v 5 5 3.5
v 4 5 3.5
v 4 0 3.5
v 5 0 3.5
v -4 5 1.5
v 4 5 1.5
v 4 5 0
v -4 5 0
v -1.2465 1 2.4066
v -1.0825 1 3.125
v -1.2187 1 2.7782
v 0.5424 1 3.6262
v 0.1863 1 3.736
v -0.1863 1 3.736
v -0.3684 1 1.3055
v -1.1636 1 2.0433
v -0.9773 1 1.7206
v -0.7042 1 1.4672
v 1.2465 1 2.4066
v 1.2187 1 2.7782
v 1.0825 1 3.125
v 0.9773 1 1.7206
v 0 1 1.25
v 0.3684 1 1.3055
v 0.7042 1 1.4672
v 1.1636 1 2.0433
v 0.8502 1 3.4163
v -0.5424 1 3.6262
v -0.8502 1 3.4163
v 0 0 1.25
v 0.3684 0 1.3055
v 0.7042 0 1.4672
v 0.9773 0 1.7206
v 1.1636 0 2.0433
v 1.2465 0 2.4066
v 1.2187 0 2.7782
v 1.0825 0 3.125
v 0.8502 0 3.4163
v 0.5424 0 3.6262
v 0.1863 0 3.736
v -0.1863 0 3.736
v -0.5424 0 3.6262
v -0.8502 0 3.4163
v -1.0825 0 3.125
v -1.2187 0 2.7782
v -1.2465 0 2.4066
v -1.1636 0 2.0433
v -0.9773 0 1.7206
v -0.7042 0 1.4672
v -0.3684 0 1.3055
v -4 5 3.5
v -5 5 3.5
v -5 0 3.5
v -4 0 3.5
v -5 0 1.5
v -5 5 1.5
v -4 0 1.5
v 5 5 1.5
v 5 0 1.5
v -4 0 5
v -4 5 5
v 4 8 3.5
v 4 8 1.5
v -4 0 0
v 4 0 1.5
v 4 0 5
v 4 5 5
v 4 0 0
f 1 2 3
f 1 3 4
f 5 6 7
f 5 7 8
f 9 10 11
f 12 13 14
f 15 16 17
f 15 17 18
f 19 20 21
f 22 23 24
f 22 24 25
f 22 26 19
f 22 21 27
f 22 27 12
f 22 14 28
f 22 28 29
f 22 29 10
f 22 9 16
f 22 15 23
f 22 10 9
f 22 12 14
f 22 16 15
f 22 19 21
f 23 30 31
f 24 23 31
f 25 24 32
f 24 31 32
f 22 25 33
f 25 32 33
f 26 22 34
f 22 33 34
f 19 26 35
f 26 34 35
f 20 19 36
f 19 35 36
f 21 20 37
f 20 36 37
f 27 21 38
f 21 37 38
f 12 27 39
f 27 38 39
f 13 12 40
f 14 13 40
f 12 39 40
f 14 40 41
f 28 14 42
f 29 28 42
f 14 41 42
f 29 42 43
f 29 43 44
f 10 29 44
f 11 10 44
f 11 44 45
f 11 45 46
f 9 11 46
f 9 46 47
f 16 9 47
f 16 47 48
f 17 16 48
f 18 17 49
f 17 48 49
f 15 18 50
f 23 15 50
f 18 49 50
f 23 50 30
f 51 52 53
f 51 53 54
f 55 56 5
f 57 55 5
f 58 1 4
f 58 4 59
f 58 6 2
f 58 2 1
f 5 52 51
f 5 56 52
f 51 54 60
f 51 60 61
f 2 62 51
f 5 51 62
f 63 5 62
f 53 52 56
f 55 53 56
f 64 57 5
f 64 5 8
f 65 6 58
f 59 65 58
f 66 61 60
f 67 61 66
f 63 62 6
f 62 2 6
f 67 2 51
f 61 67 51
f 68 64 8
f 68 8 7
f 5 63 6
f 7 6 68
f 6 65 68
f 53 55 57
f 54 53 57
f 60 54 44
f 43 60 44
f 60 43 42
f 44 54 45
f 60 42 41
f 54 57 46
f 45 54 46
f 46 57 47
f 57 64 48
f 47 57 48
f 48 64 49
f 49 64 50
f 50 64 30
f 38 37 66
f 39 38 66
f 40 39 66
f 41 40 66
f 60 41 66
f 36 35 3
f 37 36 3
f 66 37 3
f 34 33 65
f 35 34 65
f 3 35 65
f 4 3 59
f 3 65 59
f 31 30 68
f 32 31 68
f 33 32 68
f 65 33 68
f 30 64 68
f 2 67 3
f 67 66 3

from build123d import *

# Parameters (mm, degrees)
SKETCH_1_W          = 8
SKETCH_1_H          = 5
EXTRUDE_1_DEPTH     = 5
SKETCH_2_W          = 1
SKETCH_2_H          = 2
EXTRUDE_2_DEPTH     = 5
EXTRUDE_3_DEPTH     = 1
SKETCH_7_W          = 8
SKETCH_7_H          = 1.5
EXTRUDE_4_DEPTH     = 1
CUT_EXTRUDE_2_DEPTH = 11.677078252
CUT_EXTRUDE_3_DEPTH = 10
CUT_EXTRUDE_4_DEPTH = 10
SKETCH_11_R         = 1.25
CUT_EXTRUDE_5_DEPTH = 1


with BuildPart() as part:
    # 草图1 → 凸台-拉伸1 (new body)
    with BuildSketch(Plane.XY):
        with Locations((0, 2.5)):
            Rectangle(SKETCH_1_W, SKETCH_1_H)
    extrude(amount=EXTRUDE_1_DEPTH)

    # 草图2 → 凸台-拉伸2 (add)
    with BuildSketch(Plane(origin=(0, 5, 0), x_dir=(1, 0, 0), z_dir=(0, 1, 0))):
        with Locations((-4.5, -2.5)):
            Rectangle(SKETCH_2_W, SKETCH_2_H)
        with Locations((4.5, -2.5)):
            Rectangle(SKETCH_2_W, SKETCH_2_H)
    extrude(amount=-EXTRUDE_2_DEPTH)

    # 草图6 → 凸台-拉伸3 (add, symmetric)
    with BuildSketch(Plane.XY.offset(2.5)):
        Polygon((4, 5), (4, 8), (-4, 5), align=None)
    extrude(amount=EXTRUDE_3_DEPTH, both=True)

    # 草图7 → 凸台-拉伸4 (add)
    with BuildSketch(Plane(origin=(0, 5, 0), x_dir=(1, 0, 0), z_dir=(0, 1, 0))):
        with Locations((0, -0.75)):
            Rectangle(SKETCH_7_W, SKETCH_7_H)
        with Locations((0, -4.25)):
            Rectangle(SKETCH_7_W, SKETCH_7_H)
    extrude(amount=EXTRUDE_4_DEPTH)

    # 草图8 → 切除-拉伸2 (cut, through all)
    with BuildSketch(Plane.XY.offset(5)):
        Polygon((-4, 5), (4, 8), (-4.143186706, 8), (-4.143186706, 5), align=None)
    extrude(amount=-CUT_EXTRUDE_2_DEPTH, mode=Mode.SUBTRACT)

    # 草图9 → 切除-拉伸3 (cut)
    with BuildSketch(Plane(origin=(0, 0, 1.5), x_dir=(-1, 0, 0), z_dir=(0, 0, -1))):
        Polygon((-4, 8), (-4, 5), (4, 5), align=None)
    extrude(amount=CUT_EXTRUDE_3_DEPTH, mode=Mode.SUBTRACT)

    # 草图10 → 切除-拉伸4 (cut)
    with BuildSketch(Plane.XY.offset(3.5)):
        Polygon((4, 8), (4, 5), (-4, 5), align=None)
    extrude(amount=CUT_EXTRUDE_4_DEPTH, mode=Mode.SUBTRACT)

    # 草图11 → 切除-拉伸5 (cut)
    with BuildSketch(Plane.XZ):
        with Locations(Location((0, 2.5, 0), (0, 0, 270))):
            Circle(SKETCH_11_R)
    extrude(amount=-CUT_EXTRUDE_5_DEPTH, mode=Mode.SUBTRACT)


solid = part.part
